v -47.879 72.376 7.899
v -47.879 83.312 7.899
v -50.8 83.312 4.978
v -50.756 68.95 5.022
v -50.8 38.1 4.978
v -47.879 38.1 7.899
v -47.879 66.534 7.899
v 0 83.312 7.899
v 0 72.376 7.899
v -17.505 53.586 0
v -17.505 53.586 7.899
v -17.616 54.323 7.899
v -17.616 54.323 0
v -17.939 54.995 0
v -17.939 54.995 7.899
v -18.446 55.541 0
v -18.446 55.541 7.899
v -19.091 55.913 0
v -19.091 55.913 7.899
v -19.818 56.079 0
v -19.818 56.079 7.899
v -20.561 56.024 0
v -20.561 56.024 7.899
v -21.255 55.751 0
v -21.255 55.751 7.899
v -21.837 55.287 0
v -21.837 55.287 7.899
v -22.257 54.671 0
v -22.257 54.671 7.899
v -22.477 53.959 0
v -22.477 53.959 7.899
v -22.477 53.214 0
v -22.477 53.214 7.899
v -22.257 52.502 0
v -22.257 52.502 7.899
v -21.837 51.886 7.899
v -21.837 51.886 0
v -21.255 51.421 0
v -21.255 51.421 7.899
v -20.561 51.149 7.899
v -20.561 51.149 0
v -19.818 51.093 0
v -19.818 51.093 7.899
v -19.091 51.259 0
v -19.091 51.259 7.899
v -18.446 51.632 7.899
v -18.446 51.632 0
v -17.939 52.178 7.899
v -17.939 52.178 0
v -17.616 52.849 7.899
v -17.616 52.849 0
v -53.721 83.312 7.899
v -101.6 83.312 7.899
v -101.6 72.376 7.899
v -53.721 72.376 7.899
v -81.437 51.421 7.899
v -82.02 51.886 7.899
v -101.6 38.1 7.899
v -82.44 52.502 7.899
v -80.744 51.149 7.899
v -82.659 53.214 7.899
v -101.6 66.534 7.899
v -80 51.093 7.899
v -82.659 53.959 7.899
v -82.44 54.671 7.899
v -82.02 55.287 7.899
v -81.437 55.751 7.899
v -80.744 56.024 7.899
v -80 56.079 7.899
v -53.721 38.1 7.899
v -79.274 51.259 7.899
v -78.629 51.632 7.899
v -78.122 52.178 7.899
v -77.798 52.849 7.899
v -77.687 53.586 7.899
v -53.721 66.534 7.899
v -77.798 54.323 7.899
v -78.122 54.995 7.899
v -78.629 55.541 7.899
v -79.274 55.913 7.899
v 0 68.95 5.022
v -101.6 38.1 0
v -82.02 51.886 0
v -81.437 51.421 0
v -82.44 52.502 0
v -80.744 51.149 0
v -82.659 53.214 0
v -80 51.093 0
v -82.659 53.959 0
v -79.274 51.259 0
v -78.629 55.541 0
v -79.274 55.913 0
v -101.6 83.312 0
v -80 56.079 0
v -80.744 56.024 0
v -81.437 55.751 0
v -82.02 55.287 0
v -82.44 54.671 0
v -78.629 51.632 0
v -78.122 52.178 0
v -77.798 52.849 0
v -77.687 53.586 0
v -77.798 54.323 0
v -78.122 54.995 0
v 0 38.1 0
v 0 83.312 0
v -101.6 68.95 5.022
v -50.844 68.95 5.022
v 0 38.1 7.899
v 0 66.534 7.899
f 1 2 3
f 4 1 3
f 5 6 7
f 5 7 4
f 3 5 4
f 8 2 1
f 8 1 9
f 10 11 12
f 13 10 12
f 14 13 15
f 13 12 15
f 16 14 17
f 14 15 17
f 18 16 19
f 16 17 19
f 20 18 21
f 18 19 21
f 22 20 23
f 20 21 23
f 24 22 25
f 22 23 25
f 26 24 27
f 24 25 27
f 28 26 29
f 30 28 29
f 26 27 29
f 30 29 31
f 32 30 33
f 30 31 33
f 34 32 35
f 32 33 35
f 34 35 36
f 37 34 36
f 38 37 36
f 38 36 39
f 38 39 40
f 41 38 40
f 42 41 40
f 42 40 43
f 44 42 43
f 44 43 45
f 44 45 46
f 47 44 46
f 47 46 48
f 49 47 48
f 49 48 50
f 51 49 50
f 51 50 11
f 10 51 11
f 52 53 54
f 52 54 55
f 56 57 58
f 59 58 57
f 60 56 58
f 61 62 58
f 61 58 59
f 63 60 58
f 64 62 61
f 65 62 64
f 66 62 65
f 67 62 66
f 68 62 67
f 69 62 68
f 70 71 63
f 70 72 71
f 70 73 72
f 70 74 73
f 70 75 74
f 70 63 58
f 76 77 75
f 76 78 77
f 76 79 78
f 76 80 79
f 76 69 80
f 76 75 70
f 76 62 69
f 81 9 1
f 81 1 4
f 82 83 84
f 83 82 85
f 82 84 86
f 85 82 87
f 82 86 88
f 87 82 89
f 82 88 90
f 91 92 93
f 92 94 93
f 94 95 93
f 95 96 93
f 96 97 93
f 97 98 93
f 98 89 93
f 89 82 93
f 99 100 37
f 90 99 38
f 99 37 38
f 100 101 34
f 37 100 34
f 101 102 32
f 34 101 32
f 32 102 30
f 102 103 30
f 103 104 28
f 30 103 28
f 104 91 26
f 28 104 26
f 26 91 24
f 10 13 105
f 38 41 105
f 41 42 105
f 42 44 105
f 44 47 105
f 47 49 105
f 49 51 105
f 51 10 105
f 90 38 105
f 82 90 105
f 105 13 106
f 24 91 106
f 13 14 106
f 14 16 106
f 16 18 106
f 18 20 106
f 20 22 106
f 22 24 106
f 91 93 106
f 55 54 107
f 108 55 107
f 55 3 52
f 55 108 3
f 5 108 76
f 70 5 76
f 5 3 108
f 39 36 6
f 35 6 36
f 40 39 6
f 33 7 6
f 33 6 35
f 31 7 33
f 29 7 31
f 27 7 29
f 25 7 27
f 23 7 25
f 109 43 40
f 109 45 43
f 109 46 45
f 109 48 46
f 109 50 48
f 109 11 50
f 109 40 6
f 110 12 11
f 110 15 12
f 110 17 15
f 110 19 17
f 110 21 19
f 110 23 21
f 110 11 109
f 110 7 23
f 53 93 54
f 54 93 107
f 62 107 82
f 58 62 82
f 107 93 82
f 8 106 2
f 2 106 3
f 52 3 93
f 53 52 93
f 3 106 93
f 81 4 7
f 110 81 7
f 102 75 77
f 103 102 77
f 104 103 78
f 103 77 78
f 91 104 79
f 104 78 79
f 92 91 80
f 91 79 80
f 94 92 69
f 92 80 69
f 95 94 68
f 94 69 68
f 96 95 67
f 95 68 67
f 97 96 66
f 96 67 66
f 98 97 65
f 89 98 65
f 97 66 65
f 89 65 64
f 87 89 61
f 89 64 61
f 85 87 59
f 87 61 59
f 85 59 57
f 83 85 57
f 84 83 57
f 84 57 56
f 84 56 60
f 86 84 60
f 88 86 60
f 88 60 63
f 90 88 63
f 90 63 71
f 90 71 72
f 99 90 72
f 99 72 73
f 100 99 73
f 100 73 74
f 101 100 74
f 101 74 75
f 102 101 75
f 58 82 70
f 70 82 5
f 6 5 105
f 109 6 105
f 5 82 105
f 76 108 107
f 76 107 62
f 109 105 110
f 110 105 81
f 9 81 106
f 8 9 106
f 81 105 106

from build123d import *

# Parameters (mm, degrees)
BOSS_EXTRUDE1_DEPTH     = 7.8994
CUT_EXTRUDE1_DEPTH      = 132.627694139
CUT_EXTRUDE1_DEPTH_BACK = 132.627694139
CUT_EXTRUDE2_DEPTH      = 112.485808354
CUT_EXTRUDE2_DEPTH_BACK = 112.485808354
M6X1_0_TAPPED_HOLE1_D   = 5


with BuildPart() as part:
    # Sketch1 → Boss-Extrude1 (new body)
    with BuildSketch(Plane.XY):
        Polygon((-101.6, 83.312), (-101.6, 38.1), (-69.85, 38.1), (-31.75, 38.1), (0, 38.1), (0, 83.312), align=None)
    extrude(amount=BOSS_EXTRUDE1_DEPTH)

    # Sketch2 → Cut-Extrude1 (cut, two sides: drawn at the far end of the back side and taken through both)
    with BuildSketch(Plane.ZY.offset(101.6).offset(-CUT_EXTRUDE1_DEPTH_BACK)):
        Polygon((59.566381815, 133.911082828), (7.8994, 72.376195004), (5.022457184, 68.949783256), (7.8994, 66.534195004), (69.434287825, 14.867213189), (229.583733305, 28.142484569), (219.715827295, 147.186354208), align=None)
    extrude(amount=CUT_EXTRUDE1_DEPTH + CUT_EXTRUDE1_DEPTH_BACK, mode=Mode.SUBTRACT)

    # Sketch3 → Cut-Extrude2 (cut, two sides: drawn at the far end of the back side and taken through both)
    with BuildSketch(Plane(origin=(0, 83.312, 0), x_dir=(1, 0, 0), z_dir=(0, 1, 0)).offset(-CUT_EXTRUDE2_DEPTH_BACK)):
        Polygon((35.981993731, -91.760393731), (-47.879, -7.8994), (-50.8, -4.9784), (-53.721, -7.8994), (-137.581993731, -91.760393731), (-137.581993731, -328.955103109), (35.981993731, -328.955103109), align=None)
    extrude(amount=CUT_EXTRUDE2_DEPTH + CUT_EXTRUDE2_DEPTH_BACK, mode=Mode.SUBTRACT)

    # M6x1.0 Tapped Hole1 (through all)
    with Locations(Plane(origin=(-50.8, 0, 0), x_dir=(-1, 0, 0), z_dir=(0, 0, -1))):
        with Locations((-30.795161674, 53.586240129), (29.387245779, 53.586240129)):
            Hole(M6X1_0_TAPPED_HOLE1_D / 2)


solid = part.part
